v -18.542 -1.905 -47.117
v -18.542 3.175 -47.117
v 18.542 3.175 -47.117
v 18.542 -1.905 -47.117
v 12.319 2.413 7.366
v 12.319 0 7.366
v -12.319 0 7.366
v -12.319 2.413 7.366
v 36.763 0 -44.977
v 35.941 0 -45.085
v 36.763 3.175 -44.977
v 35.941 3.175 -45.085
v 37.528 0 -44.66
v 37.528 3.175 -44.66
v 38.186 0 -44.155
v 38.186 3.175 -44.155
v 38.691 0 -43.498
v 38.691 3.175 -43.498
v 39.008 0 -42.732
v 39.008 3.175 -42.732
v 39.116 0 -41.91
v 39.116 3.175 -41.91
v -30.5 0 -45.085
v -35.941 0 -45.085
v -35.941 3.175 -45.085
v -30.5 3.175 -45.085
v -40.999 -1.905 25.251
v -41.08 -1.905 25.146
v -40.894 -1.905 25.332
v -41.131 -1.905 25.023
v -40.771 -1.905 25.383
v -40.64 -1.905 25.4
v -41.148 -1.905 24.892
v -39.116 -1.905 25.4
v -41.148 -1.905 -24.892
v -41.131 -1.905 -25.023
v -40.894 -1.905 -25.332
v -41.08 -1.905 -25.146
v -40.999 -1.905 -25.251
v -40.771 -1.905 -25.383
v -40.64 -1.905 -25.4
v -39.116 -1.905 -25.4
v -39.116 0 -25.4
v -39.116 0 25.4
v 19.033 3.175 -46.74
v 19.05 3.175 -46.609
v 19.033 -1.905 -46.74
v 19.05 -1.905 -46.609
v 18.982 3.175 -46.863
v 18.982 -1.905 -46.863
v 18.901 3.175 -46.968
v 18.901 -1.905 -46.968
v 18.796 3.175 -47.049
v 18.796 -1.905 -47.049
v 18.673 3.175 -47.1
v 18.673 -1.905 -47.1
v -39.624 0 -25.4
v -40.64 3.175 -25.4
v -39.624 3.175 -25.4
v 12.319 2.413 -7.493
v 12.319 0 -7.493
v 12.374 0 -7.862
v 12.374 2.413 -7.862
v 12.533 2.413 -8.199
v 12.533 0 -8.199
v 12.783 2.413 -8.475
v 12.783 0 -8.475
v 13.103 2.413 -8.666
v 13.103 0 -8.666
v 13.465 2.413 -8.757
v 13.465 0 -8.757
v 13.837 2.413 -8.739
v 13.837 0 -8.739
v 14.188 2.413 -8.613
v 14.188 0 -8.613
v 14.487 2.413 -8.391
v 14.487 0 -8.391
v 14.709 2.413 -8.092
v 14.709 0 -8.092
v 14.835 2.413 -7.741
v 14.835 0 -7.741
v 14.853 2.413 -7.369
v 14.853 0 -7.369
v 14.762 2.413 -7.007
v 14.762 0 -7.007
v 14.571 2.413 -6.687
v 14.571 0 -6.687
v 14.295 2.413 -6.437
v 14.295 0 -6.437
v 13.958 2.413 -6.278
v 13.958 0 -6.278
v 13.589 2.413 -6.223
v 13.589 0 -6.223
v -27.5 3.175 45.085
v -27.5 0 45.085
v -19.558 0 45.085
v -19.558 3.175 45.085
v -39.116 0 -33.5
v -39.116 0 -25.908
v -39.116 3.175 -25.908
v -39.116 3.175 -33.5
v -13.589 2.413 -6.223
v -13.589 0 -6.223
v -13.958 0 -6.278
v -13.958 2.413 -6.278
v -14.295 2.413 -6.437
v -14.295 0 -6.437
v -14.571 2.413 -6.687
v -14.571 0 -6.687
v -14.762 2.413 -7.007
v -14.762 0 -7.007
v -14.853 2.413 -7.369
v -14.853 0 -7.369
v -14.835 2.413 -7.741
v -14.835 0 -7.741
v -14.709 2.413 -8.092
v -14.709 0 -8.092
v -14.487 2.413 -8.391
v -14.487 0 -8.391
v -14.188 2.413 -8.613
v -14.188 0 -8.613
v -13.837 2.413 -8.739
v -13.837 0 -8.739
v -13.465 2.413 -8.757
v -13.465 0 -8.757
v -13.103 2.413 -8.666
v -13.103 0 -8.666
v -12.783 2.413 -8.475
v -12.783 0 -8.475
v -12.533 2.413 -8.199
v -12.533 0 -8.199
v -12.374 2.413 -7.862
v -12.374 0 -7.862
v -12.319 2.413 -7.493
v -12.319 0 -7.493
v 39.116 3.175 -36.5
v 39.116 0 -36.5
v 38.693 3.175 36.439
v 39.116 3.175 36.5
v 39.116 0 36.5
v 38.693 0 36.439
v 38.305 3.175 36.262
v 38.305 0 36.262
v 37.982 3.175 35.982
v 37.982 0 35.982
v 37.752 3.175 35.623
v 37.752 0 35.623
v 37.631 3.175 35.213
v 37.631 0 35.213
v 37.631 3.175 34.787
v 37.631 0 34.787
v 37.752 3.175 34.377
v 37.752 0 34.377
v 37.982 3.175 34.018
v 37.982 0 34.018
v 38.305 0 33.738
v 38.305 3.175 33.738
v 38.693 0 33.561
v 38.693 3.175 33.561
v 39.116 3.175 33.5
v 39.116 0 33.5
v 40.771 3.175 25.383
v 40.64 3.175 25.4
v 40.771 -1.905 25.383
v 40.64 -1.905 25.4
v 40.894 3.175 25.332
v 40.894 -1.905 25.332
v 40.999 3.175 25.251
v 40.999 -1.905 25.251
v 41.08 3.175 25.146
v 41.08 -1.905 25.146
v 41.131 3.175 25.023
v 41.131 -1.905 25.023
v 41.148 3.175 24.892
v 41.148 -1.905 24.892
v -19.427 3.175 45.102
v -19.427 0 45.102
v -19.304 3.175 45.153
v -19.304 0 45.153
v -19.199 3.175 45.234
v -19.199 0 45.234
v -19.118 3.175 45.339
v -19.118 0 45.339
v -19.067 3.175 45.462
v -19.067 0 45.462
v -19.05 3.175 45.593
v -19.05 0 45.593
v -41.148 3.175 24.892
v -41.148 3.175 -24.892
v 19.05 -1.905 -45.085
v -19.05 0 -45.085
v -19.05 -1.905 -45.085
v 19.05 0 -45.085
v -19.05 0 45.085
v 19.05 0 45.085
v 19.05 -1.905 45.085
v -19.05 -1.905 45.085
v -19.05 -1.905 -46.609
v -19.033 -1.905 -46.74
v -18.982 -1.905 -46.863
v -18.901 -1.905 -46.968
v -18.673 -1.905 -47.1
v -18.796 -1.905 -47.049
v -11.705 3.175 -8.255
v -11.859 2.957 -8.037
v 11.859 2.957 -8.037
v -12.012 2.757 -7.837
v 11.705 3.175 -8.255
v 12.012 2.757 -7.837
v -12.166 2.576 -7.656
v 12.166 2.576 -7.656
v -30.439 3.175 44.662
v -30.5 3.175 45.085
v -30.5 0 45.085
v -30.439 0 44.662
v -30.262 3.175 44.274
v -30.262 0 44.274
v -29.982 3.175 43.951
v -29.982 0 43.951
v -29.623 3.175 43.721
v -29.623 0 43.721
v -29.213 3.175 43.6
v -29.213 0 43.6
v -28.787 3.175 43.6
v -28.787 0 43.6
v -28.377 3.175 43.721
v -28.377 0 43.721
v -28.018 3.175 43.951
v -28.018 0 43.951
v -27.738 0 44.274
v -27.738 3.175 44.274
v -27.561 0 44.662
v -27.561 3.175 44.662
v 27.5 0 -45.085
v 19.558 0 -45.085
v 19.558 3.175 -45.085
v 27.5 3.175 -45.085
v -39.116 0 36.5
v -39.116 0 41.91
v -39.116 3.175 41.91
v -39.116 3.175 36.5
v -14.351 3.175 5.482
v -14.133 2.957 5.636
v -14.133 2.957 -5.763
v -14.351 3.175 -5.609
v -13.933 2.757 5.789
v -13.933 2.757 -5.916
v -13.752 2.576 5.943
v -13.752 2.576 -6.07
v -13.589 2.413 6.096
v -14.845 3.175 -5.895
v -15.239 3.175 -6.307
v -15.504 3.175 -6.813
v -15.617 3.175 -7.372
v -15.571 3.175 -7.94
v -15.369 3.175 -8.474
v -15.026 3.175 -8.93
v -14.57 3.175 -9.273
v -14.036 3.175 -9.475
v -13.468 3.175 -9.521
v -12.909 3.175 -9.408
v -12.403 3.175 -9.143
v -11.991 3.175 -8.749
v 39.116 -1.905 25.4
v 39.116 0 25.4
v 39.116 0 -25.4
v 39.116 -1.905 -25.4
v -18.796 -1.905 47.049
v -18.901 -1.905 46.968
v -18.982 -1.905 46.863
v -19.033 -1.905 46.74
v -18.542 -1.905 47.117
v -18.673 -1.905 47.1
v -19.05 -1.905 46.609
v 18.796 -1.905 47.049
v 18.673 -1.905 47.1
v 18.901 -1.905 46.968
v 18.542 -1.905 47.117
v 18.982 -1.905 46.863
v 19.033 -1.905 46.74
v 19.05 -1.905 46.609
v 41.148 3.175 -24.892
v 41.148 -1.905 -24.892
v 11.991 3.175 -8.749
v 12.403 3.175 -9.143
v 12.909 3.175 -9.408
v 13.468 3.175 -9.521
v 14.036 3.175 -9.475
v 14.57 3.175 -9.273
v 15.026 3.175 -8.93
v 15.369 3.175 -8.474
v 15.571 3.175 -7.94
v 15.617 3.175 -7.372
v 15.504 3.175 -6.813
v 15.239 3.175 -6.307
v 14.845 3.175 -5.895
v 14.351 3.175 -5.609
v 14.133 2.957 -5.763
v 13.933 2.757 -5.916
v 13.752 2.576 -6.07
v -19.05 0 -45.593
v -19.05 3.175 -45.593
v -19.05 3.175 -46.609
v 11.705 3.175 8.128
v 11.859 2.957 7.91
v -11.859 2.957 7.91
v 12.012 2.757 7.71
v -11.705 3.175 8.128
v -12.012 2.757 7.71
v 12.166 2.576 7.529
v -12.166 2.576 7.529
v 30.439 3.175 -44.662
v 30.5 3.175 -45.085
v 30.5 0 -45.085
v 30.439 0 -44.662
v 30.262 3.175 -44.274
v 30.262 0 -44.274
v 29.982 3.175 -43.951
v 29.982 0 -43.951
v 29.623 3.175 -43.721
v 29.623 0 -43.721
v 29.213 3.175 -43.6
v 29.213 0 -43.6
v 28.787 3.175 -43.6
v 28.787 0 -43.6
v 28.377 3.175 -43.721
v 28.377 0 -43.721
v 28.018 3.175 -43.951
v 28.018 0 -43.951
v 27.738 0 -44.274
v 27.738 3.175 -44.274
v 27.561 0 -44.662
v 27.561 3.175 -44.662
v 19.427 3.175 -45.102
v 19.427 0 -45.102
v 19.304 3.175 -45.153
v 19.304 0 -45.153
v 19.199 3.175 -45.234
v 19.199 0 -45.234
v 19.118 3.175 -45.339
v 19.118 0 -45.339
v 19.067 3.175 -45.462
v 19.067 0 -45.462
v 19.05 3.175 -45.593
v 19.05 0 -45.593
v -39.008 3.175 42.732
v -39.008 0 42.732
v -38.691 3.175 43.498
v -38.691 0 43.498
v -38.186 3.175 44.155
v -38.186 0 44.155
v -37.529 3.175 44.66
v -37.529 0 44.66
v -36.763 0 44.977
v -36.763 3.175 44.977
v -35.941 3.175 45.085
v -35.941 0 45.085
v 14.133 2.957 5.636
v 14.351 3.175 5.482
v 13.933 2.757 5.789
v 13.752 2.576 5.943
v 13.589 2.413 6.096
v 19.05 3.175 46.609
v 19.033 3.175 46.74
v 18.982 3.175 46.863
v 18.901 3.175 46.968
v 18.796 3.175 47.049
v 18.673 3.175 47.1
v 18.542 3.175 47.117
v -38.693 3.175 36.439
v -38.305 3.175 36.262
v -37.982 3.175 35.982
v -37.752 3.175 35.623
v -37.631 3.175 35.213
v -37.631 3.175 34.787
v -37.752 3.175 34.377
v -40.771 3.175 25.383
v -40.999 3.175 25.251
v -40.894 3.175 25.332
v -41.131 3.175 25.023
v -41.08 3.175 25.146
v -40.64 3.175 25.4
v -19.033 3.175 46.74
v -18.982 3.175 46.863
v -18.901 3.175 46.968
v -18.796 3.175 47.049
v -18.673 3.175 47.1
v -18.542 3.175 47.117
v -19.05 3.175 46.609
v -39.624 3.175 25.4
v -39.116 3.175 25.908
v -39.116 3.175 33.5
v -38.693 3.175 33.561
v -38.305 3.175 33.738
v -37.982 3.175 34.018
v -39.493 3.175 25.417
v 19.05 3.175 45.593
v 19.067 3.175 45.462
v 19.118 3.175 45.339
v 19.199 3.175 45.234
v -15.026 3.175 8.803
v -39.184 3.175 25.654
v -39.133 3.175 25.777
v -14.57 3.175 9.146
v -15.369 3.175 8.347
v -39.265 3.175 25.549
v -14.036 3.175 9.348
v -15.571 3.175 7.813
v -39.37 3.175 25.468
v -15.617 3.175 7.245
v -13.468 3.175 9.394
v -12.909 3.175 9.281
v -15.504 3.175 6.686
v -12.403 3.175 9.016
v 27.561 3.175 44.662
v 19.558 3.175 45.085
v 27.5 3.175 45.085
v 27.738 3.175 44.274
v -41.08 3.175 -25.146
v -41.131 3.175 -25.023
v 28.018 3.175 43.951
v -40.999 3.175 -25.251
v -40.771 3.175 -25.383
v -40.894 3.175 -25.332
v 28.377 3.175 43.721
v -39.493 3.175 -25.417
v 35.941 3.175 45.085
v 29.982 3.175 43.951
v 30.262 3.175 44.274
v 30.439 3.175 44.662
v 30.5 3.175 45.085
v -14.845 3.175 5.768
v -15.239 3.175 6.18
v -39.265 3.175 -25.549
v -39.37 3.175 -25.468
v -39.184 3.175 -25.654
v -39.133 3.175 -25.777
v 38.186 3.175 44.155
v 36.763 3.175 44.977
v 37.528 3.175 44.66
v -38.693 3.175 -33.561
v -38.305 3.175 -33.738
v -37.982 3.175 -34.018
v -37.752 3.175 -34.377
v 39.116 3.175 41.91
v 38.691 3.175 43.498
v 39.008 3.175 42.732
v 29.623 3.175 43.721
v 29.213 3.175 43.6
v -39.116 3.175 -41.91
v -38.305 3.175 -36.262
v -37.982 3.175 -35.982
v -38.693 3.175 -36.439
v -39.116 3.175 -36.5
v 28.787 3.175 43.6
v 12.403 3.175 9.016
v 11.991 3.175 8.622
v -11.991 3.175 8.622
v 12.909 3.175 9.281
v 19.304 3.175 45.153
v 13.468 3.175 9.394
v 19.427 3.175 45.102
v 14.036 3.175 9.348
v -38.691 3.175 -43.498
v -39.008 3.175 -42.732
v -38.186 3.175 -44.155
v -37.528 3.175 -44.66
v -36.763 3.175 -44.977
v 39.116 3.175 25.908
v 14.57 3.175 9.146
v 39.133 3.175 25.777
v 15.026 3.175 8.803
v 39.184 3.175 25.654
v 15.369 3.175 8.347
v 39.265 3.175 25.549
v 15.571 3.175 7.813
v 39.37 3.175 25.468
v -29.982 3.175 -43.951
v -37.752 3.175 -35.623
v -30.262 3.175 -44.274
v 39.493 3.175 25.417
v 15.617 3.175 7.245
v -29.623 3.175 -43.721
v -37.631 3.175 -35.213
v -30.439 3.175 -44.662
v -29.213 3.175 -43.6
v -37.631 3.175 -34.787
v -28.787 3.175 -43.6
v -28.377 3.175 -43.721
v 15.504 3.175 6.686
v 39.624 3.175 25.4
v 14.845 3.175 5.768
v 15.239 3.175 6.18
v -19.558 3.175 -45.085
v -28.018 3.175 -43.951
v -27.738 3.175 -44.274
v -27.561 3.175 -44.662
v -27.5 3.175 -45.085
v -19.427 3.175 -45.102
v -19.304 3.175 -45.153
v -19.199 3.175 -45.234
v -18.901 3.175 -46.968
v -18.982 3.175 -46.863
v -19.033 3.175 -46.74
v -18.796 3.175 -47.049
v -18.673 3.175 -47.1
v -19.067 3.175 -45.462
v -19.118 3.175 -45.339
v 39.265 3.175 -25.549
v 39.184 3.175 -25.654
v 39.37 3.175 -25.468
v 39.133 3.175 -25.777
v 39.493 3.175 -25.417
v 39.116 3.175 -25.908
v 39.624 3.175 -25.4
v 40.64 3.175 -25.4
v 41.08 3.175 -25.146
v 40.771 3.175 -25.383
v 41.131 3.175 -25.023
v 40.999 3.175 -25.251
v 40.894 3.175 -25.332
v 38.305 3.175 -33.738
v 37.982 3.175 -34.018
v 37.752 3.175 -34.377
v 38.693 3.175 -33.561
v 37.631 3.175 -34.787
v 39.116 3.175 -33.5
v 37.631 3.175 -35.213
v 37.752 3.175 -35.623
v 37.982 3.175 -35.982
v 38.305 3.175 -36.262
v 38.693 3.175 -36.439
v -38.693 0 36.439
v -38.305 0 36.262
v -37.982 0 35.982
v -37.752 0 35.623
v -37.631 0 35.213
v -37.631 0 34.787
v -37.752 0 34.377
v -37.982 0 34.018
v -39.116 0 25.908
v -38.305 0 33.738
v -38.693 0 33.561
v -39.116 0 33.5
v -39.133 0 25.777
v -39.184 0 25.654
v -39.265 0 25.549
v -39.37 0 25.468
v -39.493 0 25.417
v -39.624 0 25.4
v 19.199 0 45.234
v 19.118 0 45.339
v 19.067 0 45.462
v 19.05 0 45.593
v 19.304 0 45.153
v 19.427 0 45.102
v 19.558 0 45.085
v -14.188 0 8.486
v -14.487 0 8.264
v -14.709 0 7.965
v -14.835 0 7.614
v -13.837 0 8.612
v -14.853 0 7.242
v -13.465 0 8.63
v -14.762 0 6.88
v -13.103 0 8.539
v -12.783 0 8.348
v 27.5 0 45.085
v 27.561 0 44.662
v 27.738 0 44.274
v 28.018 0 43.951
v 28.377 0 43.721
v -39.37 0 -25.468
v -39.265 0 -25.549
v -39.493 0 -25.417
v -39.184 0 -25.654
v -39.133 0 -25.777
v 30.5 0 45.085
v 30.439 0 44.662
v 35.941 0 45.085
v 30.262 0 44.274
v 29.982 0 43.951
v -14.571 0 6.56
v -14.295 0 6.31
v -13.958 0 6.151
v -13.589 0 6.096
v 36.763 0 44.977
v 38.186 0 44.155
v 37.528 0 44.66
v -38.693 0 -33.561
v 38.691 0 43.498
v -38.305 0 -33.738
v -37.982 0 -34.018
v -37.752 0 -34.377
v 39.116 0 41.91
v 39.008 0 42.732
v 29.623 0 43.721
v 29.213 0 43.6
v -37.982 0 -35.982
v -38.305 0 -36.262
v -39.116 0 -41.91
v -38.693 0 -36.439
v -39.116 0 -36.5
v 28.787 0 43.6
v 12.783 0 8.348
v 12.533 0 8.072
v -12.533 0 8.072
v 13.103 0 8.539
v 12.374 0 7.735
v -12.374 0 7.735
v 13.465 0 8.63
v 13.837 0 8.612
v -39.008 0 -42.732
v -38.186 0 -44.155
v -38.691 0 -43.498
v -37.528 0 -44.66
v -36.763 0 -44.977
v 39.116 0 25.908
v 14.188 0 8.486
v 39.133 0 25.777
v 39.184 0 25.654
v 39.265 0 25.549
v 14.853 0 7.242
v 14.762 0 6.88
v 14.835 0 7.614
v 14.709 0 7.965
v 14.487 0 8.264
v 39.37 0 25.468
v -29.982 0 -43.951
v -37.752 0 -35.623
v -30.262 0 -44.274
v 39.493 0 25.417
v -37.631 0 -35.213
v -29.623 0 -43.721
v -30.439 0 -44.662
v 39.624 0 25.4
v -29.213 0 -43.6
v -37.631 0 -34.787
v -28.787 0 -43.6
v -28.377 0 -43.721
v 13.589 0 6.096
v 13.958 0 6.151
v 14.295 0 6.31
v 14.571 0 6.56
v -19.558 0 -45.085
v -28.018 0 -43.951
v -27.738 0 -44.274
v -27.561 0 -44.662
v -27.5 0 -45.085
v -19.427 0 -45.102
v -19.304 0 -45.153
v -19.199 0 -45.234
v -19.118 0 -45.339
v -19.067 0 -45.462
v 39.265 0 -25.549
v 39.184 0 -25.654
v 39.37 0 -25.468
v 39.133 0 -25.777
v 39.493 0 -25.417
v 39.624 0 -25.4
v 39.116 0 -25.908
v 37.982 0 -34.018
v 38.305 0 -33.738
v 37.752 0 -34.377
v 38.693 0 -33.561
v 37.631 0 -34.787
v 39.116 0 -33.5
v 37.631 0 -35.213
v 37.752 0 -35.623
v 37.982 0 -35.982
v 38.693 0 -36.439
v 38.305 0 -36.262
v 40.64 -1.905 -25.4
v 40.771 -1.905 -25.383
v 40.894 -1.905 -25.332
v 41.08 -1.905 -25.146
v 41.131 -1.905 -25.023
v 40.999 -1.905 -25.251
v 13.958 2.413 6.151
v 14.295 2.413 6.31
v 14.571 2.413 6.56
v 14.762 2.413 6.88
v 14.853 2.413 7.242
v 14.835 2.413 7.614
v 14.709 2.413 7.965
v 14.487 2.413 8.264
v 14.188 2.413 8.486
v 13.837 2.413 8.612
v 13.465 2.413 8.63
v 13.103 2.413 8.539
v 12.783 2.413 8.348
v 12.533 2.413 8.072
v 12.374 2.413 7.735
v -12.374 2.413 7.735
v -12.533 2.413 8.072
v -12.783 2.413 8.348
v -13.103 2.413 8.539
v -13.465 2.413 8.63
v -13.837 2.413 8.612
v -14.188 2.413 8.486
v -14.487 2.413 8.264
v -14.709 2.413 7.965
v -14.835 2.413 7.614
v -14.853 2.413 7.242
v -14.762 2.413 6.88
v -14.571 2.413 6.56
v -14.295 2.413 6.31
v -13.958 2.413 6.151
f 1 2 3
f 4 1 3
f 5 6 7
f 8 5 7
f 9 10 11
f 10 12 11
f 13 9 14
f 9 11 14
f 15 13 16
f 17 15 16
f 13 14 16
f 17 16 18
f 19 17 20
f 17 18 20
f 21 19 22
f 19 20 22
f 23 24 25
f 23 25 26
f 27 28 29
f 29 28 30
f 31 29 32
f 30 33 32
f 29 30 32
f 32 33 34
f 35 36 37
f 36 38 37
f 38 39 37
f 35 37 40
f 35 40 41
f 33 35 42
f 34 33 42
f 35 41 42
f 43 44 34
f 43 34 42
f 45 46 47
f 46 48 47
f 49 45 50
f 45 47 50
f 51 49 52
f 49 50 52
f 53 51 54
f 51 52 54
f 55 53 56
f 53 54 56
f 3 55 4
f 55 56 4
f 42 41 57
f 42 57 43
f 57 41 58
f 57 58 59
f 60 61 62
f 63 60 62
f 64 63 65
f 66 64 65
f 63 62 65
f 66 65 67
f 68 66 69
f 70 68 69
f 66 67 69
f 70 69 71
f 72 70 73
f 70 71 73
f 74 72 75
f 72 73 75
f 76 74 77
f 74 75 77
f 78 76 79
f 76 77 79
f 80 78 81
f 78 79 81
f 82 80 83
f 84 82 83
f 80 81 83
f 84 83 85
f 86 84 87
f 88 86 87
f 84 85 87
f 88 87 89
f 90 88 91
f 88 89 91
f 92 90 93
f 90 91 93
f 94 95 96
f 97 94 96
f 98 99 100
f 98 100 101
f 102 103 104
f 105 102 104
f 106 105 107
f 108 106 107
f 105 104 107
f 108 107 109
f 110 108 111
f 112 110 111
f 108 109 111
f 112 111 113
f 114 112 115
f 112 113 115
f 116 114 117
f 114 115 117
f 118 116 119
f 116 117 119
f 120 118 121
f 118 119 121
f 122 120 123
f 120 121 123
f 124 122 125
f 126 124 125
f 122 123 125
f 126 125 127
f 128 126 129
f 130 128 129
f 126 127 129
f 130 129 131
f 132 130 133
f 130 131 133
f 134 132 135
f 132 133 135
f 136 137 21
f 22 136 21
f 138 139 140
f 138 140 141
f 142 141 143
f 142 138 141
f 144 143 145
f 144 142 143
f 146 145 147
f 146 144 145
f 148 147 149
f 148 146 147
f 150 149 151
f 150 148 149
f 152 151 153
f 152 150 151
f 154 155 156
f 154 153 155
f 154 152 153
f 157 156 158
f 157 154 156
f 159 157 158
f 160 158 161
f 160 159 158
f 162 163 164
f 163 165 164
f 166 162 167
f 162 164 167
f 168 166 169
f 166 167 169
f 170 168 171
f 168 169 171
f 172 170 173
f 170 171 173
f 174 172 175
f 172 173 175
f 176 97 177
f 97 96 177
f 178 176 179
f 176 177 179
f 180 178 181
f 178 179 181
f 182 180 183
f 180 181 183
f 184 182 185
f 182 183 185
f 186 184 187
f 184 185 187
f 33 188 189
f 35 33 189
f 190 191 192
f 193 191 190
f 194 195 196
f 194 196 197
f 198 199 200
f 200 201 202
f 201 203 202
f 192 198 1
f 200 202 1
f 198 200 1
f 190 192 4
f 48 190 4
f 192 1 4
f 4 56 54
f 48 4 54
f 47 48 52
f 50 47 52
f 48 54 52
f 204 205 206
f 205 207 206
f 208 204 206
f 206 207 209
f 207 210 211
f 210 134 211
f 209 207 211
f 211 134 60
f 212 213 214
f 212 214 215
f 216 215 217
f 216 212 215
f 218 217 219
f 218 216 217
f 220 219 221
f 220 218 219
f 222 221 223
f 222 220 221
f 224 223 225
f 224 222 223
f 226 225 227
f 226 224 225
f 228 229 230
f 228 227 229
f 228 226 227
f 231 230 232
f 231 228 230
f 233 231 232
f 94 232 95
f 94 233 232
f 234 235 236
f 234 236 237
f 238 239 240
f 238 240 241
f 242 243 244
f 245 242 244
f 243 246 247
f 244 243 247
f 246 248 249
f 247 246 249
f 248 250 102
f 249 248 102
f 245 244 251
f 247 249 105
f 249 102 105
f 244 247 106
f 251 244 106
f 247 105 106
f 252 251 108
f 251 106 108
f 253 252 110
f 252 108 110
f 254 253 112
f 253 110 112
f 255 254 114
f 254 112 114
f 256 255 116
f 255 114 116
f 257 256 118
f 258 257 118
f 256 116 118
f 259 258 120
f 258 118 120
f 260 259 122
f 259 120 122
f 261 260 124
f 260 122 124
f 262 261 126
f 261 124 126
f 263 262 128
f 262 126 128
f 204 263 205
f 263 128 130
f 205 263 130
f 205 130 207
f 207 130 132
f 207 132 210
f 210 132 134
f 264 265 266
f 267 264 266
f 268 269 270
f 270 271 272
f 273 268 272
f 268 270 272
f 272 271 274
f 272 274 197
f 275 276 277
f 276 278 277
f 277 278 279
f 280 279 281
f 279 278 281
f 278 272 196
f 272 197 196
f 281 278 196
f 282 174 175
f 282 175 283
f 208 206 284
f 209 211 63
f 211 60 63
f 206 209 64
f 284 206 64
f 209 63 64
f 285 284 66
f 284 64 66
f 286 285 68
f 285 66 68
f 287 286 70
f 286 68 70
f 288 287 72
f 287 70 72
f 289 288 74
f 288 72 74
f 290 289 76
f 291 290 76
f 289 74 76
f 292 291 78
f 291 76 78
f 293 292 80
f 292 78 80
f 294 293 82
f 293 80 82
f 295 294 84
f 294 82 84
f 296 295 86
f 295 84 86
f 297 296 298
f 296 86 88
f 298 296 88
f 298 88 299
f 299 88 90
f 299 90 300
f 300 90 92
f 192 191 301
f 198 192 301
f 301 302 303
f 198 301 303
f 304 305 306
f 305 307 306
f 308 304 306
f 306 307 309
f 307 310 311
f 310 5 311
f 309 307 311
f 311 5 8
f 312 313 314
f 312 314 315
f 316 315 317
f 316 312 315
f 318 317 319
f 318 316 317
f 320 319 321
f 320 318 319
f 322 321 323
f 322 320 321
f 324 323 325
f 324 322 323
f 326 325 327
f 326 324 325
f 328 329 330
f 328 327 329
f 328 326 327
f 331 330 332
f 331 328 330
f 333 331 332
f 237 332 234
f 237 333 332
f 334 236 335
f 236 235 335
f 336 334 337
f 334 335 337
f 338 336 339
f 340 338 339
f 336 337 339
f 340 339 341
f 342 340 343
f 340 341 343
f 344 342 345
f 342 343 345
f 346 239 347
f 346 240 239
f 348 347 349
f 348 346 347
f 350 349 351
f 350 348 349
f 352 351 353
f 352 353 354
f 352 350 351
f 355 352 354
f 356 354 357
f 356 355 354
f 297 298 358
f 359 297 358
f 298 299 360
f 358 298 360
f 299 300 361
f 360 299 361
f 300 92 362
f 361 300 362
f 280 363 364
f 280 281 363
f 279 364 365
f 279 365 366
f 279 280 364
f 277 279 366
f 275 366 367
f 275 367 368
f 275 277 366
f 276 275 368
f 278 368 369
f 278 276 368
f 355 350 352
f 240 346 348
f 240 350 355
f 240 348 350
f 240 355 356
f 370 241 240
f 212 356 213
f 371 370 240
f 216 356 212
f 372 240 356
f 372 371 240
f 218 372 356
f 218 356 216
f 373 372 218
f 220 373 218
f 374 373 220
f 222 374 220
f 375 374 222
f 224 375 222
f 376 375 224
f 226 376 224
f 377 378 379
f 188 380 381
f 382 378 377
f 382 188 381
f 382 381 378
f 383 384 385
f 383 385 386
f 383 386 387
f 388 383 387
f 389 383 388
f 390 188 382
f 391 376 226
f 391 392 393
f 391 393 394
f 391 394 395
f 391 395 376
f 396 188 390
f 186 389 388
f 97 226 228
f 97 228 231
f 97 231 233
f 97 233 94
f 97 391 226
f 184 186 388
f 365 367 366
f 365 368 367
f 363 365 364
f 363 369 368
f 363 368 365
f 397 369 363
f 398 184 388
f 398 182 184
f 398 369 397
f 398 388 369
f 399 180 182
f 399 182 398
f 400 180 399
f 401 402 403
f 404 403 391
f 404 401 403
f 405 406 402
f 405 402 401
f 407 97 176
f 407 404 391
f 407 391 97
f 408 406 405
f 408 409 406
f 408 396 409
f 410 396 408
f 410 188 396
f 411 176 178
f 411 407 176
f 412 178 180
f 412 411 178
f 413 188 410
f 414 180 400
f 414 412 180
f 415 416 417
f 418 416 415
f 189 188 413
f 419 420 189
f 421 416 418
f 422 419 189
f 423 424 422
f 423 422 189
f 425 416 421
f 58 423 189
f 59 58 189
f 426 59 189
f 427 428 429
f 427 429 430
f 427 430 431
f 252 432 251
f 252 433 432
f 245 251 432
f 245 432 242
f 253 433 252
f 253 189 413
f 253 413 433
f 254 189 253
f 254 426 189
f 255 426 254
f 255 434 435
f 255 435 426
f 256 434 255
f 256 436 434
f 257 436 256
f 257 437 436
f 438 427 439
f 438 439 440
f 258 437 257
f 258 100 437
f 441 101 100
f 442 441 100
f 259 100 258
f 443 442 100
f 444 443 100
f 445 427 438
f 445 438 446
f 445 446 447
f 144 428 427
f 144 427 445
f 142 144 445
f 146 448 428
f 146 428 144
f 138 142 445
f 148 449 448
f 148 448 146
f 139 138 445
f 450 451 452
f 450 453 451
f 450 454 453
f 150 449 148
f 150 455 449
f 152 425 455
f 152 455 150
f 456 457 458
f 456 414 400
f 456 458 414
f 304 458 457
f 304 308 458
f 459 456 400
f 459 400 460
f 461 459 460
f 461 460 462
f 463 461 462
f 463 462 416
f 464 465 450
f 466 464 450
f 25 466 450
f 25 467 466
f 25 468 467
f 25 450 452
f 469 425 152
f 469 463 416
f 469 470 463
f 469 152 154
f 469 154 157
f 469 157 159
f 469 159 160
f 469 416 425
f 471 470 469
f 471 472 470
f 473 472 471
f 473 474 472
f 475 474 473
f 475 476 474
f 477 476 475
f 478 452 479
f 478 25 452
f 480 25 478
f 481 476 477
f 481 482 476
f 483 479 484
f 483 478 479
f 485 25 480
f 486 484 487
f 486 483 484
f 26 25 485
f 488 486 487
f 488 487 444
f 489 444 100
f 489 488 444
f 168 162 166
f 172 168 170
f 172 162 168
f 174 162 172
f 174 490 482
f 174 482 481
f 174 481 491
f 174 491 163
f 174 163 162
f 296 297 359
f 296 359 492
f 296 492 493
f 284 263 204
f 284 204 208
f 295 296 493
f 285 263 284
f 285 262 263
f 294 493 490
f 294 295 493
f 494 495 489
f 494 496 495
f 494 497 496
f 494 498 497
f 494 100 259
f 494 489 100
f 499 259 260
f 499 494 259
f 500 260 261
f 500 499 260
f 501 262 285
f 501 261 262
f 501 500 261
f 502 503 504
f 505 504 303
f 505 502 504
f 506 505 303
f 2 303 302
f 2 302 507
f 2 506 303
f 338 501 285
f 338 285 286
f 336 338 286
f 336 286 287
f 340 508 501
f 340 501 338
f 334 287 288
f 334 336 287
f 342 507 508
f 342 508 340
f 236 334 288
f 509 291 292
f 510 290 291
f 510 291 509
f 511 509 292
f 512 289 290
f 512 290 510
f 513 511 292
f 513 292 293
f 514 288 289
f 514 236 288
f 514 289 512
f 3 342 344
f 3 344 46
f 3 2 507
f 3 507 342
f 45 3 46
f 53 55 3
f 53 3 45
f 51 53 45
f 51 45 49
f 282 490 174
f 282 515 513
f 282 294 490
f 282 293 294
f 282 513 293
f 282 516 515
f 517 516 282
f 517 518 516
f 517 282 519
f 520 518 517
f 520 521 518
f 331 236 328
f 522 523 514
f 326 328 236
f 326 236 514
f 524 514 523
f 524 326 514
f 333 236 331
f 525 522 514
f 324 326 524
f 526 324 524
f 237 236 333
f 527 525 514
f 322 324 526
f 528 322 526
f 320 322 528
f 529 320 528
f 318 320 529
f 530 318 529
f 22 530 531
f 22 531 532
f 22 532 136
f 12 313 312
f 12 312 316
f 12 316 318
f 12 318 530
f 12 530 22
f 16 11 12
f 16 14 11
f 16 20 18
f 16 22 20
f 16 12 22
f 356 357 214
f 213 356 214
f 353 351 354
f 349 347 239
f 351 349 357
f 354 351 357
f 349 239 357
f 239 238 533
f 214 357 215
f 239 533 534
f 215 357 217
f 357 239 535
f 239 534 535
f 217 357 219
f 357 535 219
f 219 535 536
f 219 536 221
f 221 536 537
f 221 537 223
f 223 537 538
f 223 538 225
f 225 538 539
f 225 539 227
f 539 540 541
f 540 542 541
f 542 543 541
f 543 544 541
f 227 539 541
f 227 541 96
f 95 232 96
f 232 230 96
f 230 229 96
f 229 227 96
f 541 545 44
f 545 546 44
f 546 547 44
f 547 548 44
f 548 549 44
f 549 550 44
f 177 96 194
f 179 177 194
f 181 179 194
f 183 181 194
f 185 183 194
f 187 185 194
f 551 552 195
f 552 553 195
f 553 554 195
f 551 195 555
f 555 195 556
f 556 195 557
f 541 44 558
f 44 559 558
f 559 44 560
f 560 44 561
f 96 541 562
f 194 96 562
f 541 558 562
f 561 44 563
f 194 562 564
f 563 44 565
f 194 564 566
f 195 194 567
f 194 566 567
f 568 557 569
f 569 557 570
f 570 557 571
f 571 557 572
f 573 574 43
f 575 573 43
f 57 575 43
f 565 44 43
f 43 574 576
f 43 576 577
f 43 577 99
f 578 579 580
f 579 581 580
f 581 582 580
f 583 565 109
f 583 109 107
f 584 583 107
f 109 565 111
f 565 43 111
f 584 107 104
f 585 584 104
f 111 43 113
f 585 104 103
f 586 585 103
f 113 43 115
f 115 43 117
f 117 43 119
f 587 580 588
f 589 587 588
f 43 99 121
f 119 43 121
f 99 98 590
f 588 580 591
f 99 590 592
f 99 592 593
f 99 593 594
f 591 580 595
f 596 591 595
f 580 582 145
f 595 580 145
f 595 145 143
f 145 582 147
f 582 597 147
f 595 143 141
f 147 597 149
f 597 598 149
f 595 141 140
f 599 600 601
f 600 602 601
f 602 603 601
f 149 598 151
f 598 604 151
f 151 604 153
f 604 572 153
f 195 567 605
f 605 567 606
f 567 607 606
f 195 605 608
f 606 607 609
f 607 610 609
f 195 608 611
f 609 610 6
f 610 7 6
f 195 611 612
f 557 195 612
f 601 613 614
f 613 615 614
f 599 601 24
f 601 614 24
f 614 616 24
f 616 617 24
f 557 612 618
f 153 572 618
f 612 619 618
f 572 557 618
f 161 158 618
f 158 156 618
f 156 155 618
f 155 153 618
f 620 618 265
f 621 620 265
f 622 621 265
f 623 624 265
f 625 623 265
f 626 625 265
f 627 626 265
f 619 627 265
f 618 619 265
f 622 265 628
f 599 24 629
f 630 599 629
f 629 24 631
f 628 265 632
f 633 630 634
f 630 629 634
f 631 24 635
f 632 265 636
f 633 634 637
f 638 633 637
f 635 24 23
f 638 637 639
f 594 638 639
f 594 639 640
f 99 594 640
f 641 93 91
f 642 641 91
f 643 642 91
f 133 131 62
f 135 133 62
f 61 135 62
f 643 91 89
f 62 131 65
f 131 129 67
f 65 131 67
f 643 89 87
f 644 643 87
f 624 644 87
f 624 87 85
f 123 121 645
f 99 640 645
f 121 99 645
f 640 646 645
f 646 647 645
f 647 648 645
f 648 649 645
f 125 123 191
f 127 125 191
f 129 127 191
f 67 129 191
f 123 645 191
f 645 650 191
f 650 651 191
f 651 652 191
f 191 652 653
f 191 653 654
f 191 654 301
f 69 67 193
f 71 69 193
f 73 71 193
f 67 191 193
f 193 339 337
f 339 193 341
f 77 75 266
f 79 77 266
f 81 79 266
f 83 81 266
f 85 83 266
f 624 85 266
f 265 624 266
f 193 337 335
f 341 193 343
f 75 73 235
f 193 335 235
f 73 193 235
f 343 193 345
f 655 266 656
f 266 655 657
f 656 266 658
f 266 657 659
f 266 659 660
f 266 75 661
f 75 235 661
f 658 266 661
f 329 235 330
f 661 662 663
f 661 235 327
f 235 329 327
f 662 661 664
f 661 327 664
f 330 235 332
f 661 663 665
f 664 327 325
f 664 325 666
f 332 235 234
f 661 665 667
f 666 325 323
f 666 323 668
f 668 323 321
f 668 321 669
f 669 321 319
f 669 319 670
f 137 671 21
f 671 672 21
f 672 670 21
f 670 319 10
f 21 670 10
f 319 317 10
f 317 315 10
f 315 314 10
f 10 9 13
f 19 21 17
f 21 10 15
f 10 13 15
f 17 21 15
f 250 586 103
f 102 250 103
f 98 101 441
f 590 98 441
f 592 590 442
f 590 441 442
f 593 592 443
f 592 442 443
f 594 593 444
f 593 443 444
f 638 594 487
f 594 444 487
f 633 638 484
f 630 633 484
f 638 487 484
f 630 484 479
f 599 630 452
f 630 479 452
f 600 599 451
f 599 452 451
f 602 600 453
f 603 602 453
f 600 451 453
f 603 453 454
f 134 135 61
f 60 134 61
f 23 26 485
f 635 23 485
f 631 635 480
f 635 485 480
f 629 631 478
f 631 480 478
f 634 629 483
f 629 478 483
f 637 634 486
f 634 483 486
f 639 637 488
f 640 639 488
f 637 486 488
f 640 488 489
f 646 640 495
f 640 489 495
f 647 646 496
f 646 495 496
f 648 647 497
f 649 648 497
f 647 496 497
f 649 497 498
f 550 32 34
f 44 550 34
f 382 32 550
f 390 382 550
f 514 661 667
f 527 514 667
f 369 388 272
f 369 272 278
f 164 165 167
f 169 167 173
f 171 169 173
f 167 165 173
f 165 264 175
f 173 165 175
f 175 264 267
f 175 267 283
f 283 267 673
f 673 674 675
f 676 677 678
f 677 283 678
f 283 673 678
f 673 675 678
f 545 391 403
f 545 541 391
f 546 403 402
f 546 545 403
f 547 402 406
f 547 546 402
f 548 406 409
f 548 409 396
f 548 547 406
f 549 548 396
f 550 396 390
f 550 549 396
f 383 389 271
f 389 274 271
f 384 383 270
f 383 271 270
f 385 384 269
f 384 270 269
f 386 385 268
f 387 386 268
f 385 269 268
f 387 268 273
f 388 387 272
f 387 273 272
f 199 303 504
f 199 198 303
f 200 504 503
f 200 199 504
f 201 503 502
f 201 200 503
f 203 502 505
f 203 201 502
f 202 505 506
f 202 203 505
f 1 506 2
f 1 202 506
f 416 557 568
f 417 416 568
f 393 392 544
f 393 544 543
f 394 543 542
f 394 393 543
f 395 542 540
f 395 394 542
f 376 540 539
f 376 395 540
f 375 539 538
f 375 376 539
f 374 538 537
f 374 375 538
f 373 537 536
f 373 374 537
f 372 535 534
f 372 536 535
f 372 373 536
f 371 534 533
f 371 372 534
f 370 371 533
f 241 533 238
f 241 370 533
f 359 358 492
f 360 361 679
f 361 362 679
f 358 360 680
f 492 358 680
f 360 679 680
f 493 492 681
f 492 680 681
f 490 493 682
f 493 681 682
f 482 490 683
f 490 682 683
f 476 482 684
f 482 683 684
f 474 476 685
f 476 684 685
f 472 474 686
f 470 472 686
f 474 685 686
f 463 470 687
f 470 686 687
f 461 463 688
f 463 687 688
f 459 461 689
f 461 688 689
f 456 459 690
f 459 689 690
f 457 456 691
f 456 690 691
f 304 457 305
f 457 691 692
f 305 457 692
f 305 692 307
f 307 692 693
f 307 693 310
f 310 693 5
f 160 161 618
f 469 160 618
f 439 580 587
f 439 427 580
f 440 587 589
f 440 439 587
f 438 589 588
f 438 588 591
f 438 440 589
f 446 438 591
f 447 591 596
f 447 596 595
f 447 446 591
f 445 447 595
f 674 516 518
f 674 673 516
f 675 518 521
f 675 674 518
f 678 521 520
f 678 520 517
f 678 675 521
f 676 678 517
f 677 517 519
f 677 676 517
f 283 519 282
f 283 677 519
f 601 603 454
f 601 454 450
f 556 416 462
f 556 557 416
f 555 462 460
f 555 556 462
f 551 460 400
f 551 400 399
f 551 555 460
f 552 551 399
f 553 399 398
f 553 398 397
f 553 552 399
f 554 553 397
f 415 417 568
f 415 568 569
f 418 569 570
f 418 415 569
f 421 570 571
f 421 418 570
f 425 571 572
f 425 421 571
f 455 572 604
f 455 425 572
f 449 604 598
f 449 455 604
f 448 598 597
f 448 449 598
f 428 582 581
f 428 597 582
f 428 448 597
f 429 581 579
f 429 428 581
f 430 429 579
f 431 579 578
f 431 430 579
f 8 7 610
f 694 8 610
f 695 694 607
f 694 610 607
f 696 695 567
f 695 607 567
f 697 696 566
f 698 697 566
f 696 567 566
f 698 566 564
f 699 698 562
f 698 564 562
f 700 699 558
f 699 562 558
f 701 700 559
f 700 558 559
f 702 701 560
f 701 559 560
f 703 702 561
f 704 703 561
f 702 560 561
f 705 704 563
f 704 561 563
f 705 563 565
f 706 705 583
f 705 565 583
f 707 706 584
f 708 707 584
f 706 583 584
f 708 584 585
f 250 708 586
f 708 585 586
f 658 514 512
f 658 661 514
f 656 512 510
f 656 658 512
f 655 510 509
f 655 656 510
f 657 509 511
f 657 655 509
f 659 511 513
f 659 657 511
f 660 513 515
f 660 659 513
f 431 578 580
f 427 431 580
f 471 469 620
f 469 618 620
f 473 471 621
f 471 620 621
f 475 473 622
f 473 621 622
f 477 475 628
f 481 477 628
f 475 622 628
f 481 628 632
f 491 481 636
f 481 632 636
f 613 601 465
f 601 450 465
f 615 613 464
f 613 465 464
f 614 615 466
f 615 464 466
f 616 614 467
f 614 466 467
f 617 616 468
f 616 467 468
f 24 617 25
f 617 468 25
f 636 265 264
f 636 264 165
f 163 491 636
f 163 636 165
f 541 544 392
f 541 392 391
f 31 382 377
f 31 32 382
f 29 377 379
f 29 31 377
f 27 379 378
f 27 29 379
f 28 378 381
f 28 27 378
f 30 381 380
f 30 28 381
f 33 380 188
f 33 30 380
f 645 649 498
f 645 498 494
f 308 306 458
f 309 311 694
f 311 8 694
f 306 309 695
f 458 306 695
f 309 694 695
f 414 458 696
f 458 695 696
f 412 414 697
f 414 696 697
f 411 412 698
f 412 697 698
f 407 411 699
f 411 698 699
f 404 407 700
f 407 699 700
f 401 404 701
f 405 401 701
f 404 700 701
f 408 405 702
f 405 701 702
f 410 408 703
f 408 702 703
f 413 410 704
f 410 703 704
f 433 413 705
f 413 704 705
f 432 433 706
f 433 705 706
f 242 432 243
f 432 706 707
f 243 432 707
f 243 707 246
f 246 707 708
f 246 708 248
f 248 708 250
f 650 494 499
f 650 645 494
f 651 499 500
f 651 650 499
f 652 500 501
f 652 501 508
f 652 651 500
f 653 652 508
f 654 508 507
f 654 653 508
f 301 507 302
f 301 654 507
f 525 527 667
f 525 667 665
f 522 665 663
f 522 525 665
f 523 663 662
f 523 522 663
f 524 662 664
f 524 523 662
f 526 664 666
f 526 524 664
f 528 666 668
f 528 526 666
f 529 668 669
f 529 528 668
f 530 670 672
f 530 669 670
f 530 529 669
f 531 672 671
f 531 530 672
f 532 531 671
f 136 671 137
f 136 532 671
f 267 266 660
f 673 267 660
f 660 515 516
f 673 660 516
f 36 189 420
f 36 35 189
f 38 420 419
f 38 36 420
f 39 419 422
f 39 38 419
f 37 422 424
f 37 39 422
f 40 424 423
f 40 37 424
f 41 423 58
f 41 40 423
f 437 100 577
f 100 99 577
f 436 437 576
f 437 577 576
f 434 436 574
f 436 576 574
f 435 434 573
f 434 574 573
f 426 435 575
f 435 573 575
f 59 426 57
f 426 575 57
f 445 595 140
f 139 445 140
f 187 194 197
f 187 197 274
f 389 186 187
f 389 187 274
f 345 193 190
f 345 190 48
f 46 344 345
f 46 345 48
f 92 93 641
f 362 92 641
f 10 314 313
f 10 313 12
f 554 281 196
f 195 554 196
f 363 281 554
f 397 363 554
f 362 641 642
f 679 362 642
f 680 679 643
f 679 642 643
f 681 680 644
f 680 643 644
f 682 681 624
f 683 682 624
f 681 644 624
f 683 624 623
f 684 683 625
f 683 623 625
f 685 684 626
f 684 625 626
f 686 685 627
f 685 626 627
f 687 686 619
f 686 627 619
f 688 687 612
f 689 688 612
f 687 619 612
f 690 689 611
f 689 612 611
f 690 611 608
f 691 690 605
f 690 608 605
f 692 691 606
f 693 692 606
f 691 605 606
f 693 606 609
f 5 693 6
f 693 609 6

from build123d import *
from OCP.BRepAlgoAPI import BRepAlgoAPI_Cut
from OCP.TopTools import TopTools_ListOfShape

# Parameters (mm, degrees)
SKETCH1_W           = 78.232
SKETCH1_H           = 90.17
BOSS_EXTRUDE1_DEPTH = 3.175
FILLET1_R           = 3.175
SKETCH2_W           = 2.032
SKETCH2_H           = 50.8
SKETCH2_W_2         = 38.1
SKETCH2_H_2         = 2.032
BOSS_EXTRUDE2_DEPTH = 5.08
FILLET3_R           = 0.508
CUT_EXTRUDE1_DEPTH  = 63.761267046
CHAMFER2_SIZE       = 0.762


with BuildPart() as part:
    # Sketch1 → Boss-Extrude1 (new body)
    with BuildSketch(Plane(origin=(0, 0, 0), x_dir=(1, 0, 0), z_dir=(0, 1, 0))):
        Rectangle(SKETCH1_W, SKETCH1_H)
        with BuildLine():
            Line((-12.319, 7.493), (12.319, 7.493))
            ThreePointArc((12.319, 7.493), (14.487025612, 8.391025612), (13.589, 6.223))
            Line((13.589, 6.223), (13.589, -6.096))
            ThreePointArc((13.589, -6.096), (14.487025612, -8.264025612), (12.319, -7.366))
            Line((12.319, -7.366), (-12.319, -7.366))
            ThreePointArc((-12.319, -7.366), (-14.487025612, -8.264025612), (-13.589, -6.096))
            Line((-13.589, -6.096), (-13.589, 6.223))
            ThreePointArc((-13.589, 6.223), (-14.487025612, 8.391025612), (-12.319, 7.493))
        make_face(mode=Mode.SUBTRACT)
    extrude(amount=BOSS_EXTRUDE1_DEPTH)

    # Fillet1
    fillet1_edges = [part.edges().sort_by_distance(p)[0] for p in [
        (-39.116, 1.5875, -45.085),
        (39.116, 1.5875, -45.085),
        (39.116, 1.5875, 45.085),
        (-39.116, 1.5875, 45.085),
    ]]
    fillet(fillet1_edges, radius=FILLET1_R)


with BuildPart() as boss_extrude2_tool:
    # Sketch2 → Boss-Extrude2 (new body)
    with BuildSketch(Plane(origin=(0, 3.175, 0), x_dir=(1, 0, 0), z_dir=(0, 1, 0))):
        Polygon((19.049995564, -47.117005476), (19.049995755, -45.085005476), (-19.050004245, -45.085001889), (-19.050004436, -47.117001889), align=None)
        with Locations((-40.132001661, 0)):
            Rectangle(SKETCH2_W, SKETCH2_H)
        with Locations((0, 46.101)):
            Rectangle(SKETCH2_W_2, SKETCH2_H_2)
        with Locations((40.132001661, 0)):
            Rectangle(SKETCH2_W, SKETCH2_H)
    extrude(amount=-BOSS_EXTRUDE2_DEPTH)


with BuildPart() as part_1:
    add(part.part)


with BuildPart() as part_2:
    # Boss-Extrude2: joined with boss_extrude2_tool
    add(part_1.part.fuse(boss_extrude2_tool.part, tol=0.00001))

    # Fillet3
    fillet3_edges = [part_2.edges().sort_by_distance(p)[0] for p in [
        (19.05, 1.5875, -45.085),
        (-19.05, 1.5875, -45.085),
        (-19.05, 0.635, -47.117),
        (19.05, 0.635, -47.117),
        (-39.116001661, 1.5875, 25.4),
        (-39.116001661, 1.5875, -25.4),
        (-41.148001661, 0.635, 25.4),
        (-41.148001661, 0.635, -25.4),
        (39.116001661, 1.5875, 25.4),
        (39.116001661, 1.5875, -25.4),
        (41.148001661, 0.635, -25.4),
        (41.148001661, 0.635, 25.4),
        (19.049995755, 1.5875, 45.085005476),
        (-19.050004245, 1.5875, 45.085001889),
        (19.049995564, 0.635, 47.117005476),
        (-19.050004436, 0.635, 47.117001889),
    ]]
    fillet(fillet3_edges, radius=FILLET3_R)


with BuildPart() as cut_extrude1_tool:
    # Sketch3 → Cut-Extrude1 (new, through all)
    with BuildSketch(Plane(origin=(0, 3.175, 0), x_dir=(1, 0, 0), z_dir=(0, 1, 0))):
        with BuildLine():
            Line((-39.116, 36.5), (-39.116, 33.5))
            ThreePointArc((-39.116, 33.5), (-37.616, 35), (-39.116, 36.5))
        make_face()
        with BuildLine():
            Line((-27.5, 45.085), (-30.5, 45.085))
            ThreePointArc((-30.5, 45.085), (-29, 43.585), (-27.5, 45.085))
        make_face()
        with BuildLine():
            Line((27.499999809, 45.084997268), (30.499999809, 45.084997268))
            ThreePointArc((30.499999809, 45.084997268), (28.999999809, 43.584997268), (27.499999809, 45.084997268))
        make_face()
        with BuildLine():
            Line((39.115998859, 36.499996315), (39.115998859, 33.499996315))
            ThreePointArc((39.115998859, 33.499996315), (37.615998859, 34.999996315), (39.115998859, 36.499996315))
        make_face()
        with BuildLine():
            Line((39.115998859, -33.499996315), (39.115998859, -36.499996315))
            ThreePointArc((39.115998859, -36.499996315), (37.615998859, -34.999996315), (39.115998859, -33.499996315))
        make_face()
        with BuildLine():
            Line((30.499999809, -45.084997268), (27.499999809, -45.084997268))
            ThreePointArc((27.499999809, -45.084997268), (28.999999809, -43.584997268), (30.499999809, -45.084997268))
        make_face()
        with BuildLine():
            Line((-27.5, -45.085), (-30.5, -45.085))
            ThreePointArc((-30.5, -45.085), (-29, -43.585), (-27.5, -45.085))
        make_face()
        with BuildLine():
            Line((-39.116, -36.5), (-39.116, -33.5))
            ThreePointArc((-39.116, -33.5), (-37.616, -35), (-39.116, -36.5))
        make_face()
    extrude(amount=-CUT_EXTRUDE1_DEPTH)


with BuildPart() as part_3:
    add(part_2.part)

    # Cut-Extrude1: cut by cut_extrude1_tool, with a tolerance
    cut_extrude1_stock = TopTools_ListOfShape()
    cut_extrude1_stock.Append(part_3.part.wrapped)
    cut_extrude1_tools = TopTools_ListOfShape()
    cut_extrude1_tools.Append(cut_extrude1_tool.part.wrapped)
    cut_extrude1_cut = BRepAlgoAPI_Cut()
    cut_extrude1_cut.SetArguments(cut_extrude1_stock)
    cut_extrude1_cut.SetTools(cut_extrude1_tools)
    cut_extrude1_cut.SetFuzzyValue(0.00001)
    cut_extrude1_cut.Build()
    add(Compound.cast(cut_extrude1_cut.Shape()).solids(), mode=Mode.REPLACE)

    # Chamfer2
    chamfer2_edges = [part_3.edges().sort_by_distance(p)[0] for p in [
        (-14.487025612, 3.175, -8.391025612),
        (-13.589, 3.175, -0.0635),
        (-14.487025612, 3.175, 8.264025612),
        (0, 3.175, 7.366),
        (14.487025612, 3.175, 8.264025612),
        (13.589, 3.175, -0.0635),
        (14.487025612, 3.175, -8.391025612),
        (0, 3.175, -7.493),
    ]]
    chamfer(chamfer2_edges, length=CHAMFER2_SIZE)


solid = part_3.part
